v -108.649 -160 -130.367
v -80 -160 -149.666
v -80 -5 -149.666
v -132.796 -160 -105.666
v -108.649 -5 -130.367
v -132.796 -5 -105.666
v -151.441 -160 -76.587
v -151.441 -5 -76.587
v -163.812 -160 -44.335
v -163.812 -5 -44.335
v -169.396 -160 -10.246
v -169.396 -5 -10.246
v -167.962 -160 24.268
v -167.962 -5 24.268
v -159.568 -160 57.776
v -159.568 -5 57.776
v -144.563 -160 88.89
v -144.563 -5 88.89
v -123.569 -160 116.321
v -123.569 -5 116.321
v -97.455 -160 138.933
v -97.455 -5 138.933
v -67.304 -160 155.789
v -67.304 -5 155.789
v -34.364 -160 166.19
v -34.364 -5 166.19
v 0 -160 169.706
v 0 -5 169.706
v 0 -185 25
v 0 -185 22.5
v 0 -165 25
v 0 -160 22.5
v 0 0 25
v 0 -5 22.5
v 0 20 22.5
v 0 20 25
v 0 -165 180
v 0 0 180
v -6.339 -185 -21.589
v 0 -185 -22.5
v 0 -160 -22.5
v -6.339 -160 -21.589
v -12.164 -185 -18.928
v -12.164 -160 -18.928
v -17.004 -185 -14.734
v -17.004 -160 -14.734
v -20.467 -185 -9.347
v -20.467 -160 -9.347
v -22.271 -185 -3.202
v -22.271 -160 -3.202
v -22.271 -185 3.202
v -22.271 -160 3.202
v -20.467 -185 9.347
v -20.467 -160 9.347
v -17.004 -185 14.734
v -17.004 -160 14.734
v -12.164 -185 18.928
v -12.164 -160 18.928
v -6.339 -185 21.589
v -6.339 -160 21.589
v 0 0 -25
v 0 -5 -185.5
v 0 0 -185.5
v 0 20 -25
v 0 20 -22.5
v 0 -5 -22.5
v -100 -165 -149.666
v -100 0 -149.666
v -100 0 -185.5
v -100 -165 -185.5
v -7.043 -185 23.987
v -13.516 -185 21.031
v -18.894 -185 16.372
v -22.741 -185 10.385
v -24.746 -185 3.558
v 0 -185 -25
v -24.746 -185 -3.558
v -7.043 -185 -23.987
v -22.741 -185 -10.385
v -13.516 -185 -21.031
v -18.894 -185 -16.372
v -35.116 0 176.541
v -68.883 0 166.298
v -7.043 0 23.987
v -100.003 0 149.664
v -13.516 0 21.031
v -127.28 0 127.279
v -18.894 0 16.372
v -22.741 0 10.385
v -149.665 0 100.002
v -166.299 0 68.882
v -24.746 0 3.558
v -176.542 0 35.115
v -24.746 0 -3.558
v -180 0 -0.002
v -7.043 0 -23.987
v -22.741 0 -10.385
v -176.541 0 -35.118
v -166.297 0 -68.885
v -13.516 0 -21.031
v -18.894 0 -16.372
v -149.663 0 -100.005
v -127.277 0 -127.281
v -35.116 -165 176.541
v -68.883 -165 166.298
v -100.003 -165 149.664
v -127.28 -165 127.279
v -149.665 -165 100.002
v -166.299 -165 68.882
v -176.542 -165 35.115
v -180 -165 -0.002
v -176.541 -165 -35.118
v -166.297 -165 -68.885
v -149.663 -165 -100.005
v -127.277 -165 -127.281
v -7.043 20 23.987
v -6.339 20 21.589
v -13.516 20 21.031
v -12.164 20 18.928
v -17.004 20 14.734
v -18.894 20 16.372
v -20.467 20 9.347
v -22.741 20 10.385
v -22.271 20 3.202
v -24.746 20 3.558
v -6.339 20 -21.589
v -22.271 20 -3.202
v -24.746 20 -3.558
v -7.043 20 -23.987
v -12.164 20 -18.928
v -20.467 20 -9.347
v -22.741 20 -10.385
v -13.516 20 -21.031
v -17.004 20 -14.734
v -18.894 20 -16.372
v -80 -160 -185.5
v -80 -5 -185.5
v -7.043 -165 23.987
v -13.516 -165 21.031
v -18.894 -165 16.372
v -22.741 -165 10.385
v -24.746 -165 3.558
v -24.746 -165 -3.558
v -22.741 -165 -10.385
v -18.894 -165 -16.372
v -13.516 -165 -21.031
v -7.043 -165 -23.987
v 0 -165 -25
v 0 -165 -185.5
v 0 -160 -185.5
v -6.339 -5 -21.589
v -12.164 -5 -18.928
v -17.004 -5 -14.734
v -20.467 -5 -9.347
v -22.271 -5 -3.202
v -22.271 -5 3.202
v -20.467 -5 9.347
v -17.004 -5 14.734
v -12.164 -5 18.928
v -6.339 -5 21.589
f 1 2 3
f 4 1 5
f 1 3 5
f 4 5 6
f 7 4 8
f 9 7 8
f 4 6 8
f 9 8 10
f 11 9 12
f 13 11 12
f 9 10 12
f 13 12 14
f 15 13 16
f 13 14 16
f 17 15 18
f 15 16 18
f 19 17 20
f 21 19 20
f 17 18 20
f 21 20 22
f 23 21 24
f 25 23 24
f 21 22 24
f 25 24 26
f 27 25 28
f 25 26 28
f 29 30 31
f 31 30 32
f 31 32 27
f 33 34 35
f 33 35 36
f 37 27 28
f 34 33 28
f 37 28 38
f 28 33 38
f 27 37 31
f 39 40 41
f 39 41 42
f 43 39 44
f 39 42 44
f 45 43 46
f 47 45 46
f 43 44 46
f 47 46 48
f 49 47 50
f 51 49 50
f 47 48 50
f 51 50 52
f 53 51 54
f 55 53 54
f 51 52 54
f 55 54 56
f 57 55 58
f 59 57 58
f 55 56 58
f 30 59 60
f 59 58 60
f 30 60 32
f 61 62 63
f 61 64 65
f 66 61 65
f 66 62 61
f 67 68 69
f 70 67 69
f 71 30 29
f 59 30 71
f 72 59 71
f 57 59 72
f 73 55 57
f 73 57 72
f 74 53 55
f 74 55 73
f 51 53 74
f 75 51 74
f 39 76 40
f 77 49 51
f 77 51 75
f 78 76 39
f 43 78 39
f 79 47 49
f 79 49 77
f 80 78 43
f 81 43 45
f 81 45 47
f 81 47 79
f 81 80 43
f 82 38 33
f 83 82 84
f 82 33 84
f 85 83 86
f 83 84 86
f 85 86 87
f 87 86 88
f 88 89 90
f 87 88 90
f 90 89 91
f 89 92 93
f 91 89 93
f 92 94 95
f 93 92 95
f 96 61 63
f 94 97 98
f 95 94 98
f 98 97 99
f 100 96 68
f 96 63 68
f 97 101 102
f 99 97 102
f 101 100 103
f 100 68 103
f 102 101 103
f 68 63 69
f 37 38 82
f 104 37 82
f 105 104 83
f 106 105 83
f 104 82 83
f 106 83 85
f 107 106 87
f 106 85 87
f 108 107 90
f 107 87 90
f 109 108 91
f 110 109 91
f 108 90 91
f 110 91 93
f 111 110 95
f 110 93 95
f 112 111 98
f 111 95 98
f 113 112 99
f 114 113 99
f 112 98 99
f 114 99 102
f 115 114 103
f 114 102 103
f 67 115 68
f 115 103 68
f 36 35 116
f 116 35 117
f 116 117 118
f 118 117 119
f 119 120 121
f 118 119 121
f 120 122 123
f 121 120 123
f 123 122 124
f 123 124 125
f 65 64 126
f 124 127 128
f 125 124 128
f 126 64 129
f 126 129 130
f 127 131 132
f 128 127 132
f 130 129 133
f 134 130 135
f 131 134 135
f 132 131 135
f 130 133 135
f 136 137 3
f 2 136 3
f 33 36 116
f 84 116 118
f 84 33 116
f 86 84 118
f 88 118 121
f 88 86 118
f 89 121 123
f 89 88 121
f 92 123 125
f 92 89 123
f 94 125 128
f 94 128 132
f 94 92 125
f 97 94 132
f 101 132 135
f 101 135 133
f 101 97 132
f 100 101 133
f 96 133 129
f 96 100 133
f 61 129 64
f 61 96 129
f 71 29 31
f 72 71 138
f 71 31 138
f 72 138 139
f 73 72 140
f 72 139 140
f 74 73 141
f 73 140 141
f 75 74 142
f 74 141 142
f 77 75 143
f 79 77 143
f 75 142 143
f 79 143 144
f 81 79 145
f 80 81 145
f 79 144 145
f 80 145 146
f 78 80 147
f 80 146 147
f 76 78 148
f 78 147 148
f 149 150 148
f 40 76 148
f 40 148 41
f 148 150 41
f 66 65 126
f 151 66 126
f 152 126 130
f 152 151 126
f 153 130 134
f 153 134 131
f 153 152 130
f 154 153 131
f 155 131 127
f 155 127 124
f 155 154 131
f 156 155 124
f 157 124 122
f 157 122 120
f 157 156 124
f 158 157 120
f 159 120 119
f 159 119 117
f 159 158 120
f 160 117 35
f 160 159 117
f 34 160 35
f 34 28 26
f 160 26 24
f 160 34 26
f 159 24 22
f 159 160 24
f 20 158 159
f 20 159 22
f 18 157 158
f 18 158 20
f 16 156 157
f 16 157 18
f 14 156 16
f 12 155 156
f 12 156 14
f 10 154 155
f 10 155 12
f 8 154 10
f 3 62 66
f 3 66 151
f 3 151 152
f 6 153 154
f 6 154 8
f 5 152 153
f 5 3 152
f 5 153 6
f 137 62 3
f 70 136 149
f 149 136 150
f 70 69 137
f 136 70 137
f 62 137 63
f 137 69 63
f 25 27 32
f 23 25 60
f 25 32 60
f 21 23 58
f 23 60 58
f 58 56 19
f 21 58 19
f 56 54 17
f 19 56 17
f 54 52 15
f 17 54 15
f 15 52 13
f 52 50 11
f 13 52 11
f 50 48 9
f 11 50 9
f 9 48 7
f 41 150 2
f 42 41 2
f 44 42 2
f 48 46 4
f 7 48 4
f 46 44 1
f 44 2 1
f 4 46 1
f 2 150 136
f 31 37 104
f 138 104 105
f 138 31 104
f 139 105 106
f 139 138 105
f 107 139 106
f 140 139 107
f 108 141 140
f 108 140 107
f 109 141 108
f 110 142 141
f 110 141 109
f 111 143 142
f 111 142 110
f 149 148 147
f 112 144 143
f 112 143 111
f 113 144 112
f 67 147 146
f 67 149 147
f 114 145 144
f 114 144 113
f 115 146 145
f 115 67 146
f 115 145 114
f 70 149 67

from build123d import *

# Parameters (mm, degrees)
BOSS_EXTRUDE1_DEPTH      = 20
BOSS_EXTRUDE1_DEPTH_BACK = 5
BOSS_EXTRUDE2_START      = -5
BOSS_EXTRUDE2_DEPTH      = 5
BOSS_EXTRUDE3_REACH      = 316.977


with BuildPart() as part:
    # Sketch1 → Boss-Extrude1 (new, two sides: drawn at the far end of the back side and taken through both)
    with BuildSketch(Plane(origin=(0, 0, 0), x_dir=(1, 0, 0), z_dir=(0, 1, 0)).offset(-BOSS_EXTRUDE1_DEPTH_BACK)):
        with BuildLine():
            Line((0, 25), (0, 22.5))
            ThreePointArc((0, 22.5), (-22.5, 0), (0, -22.5))
            Line((0, -22.5), (0, -25))
            ThreePointArc((0, -25), (-25, 0), (0, 25))
        make_face()
    extrude(amount=BOSS_EXTRUDE1_DEPTH + BOSS_EXTRUDE1_DEPTH_BACK)

    # Sketch2 → Boss-Extrude2 (add)
    with BuildSketch(Plane(origin=(0, 0, 0), x_dir=(1, 0, 0), z_dir=(0, 1, 0)).offset(BOSS_EXTRUDE2_START)):
        with BuildLine():
            Line((0, -25), (0, -180))
            ThreePointArc((0, -180), (-172.249721603, -52.249721603), (-100, 149.666295471))
            Line((-100, 149.666295471), (-100, 185.5))
            Line((-100, 185.5), (0, 185.5))
            Line((0, 185.5), (0, 25))
            ThreePointArc((0, 25), (-25, 0), (0, -25))
        make_face()
    extrude(amount=BOSS_EXTRUDE2_DEPTH)


with BuildPart() as body_2:
    # Mirror1: mirrored copy
    add(part.part.mirror(Plane.ZX.offset(-82.5)))

    # Sketch3 → Boss-Extrude3 (add, up to next)
    with BuildSketch(Plane.XZ.offset(5), mode=Mode.PRIVATE) as boss_extrude3_sk1:
        with BuildLine():
            Line((-100, -149.666295471), (-100, -185.5))
            Line((-100, -185.5), (-80, -185.5))
            Line((-80, -185.5), (-80, -149.666295471))
            ThreePointArc((-80, -149.666295471), (-164.619580528, 41.235830377), (0, 169.705627485))
            Line((0, 169.705627485), (0, 180))
            ThreePointArc((0, 180), (-172.249721603, 52.249721603), (-100, -149.666295471))
        make_face()
    boss_extrude3_tool1 = extrude(boss_extrude3_sk1.sketch, amount=BOSS_EXTRUDE3_REACH, mode=Mode.PRIVATE) - body_2.part

    add(part.part)  # Boss-Extrude3 merges part
    add(boss_extrude3_tool1.solids().sort_by_distance((-95.92581, -5, -167.583148))[0])


solid = body_2.part
